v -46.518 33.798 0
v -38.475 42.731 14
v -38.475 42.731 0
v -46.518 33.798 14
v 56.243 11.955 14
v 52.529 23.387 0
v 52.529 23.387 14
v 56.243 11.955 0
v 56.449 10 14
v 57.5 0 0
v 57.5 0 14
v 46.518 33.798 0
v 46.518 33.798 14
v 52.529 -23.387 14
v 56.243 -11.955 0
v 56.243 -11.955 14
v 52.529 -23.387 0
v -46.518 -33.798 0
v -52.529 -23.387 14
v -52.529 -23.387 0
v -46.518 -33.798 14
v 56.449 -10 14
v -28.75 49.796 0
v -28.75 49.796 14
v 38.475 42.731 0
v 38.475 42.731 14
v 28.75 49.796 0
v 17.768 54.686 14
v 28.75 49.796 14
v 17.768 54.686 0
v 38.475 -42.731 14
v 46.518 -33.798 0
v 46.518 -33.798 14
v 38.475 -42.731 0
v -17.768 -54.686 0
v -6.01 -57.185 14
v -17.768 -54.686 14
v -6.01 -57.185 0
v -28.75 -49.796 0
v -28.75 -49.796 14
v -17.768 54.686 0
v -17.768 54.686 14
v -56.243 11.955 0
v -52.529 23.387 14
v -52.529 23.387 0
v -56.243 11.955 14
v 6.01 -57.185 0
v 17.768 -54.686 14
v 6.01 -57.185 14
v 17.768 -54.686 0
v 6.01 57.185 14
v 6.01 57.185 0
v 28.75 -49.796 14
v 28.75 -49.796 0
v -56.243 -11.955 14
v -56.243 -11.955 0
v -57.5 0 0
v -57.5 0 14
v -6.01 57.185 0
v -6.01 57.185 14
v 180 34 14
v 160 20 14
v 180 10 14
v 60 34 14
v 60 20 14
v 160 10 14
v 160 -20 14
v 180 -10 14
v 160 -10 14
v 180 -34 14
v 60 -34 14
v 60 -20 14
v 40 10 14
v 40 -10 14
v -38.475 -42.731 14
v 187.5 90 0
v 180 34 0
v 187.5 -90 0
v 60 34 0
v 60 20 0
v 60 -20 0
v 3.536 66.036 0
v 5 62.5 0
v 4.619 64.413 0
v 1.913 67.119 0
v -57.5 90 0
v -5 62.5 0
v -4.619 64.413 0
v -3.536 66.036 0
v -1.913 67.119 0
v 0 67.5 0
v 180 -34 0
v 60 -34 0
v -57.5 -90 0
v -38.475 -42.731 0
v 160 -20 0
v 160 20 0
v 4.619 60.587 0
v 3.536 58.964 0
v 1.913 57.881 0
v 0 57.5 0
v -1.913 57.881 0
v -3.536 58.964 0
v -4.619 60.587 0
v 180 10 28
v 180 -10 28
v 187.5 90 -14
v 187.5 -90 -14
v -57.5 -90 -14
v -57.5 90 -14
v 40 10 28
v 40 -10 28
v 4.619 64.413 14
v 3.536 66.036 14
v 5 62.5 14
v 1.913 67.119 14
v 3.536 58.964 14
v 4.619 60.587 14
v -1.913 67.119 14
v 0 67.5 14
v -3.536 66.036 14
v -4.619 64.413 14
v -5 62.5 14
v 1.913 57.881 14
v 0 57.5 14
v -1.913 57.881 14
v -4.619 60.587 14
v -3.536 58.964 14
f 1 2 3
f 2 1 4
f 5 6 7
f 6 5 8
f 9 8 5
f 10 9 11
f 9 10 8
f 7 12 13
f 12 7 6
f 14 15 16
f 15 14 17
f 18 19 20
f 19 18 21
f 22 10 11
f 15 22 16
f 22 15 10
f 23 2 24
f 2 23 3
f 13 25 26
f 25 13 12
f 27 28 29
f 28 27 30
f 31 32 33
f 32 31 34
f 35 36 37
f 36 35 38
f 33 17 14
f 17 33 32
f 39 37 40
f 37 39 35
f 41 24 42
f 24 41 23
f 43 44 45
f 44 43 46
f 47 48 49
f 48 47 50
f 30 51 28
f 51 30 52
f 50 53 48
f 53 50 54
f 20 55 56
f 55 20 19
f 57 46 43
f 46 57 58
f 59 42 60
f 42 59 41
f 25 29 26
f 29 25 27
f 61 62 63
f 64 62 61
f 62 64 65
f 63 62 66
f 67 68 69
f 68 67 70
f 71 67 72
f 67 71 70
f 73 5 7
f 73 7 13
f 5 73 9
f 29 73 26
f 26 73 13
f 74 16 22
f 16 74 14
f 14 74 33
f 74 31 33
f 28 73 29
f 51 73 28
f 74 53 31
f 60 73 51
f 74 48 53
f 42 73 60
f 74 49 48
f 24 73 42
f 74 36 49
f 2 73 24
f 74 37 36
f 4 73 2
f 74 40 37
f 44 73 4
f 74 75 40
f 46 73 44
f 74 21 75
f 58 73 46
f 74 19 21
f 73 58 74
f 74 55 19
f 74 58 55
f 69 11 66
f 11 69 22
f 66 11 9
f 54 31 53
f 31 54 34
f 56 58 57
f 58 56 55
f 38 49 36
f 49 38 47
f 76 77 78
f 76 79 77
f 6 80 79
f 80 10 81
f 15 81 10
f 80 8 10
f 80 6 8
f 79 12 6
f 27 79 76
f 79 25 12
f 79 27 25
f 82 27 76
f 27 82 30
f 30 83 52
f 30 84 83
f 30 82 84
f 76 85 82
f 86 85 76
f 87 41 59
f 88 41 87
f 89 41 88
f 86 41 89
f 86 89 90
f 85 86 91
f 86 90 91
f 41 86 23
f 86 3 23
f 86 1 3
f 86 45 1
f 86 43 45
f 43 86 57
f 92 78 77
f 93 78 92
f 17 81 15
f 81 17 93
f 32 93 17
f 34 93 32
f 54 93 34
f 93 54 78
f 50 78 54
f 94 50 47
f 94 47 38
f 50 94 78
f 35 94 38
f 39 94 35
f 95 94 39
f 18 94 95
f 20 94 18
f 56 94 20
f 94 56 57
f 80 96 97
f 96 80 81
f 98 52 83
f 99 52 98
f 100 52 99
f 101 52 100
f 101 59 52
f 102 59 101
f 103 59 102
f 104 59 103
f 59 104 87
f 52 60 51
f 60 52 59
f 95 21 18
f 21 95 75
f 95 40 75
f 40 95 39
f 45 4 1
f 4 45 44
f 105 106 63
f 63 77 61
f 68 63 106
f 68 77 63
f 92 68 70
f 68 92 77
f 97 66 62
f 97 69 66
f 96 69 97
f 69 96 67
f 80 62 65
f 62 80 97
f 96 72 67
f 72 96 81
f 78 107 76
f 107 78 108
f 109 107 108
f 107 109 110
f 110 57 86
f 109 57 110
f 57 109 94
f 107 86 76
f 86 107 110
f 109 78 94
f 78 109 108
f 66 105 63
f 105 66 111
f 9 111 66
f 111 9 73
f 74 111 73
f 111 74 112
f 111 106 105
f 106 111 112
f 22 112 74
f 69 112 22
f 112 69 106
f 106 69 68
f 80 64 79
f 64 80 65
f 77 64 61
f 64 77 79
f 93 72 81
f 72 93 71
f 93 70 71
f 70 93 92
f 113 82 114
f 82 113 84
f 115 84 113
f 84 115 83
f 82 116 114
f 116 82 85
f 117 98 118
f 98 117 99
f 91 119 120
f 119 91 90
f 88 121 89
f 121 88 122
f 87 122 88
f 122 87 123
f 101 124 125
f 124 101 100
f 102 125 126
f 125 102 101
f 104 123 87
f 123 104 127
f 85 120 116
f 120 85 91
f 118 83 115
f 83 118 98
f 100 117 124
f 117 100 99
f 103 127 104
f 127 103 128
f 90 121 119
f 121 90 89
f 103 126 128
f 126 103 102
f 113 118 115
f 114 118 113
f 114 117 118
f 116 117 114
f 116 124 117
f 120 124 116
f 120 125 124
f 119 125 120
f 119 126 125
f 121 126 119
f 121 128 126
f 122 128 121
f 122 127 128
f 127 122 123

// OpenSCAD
module drawRay(p1,p2,width,height){ // draw ray between 2 specified points
    translate((p1+p2)/2)
    rotate([-acos((p2[2]-p1[2]) / norm(p1-p2)),0,
            -atan2(p2[0]-p1[0],p2[1]-p1[1])])
    cube([width,height,norm(p1-p2)+width], center = true);

} 


module Touch1D()
{
    phi = $t*360;
    x = 0;
    y = 0;
    crank_radius = 50.0;
    rod_length = 120.0;
    elements_height = 14;
    rod_width = 20;
      
    
    circle_radius = crank_radius + 7.5;
    
    //Base
    translate([-(crank_radius+7.5), -crank_radius-40, -elements_height]){
        cube([(2.5*crank_radius+rod_length),2*crank_radius+80,elements_height], center = false);
    }
    
    
    //Crank
    translate([x, y, 0]) {

        //1 Crank cylinder
        color([235/255, 227/255, 157/255],0.5)
        cylinder(h = elements_height, r = circle_radius, center = false);

        //3 Hinge pin
        translate([crank_radius*cos(phi),crank_radius*sin(phi),elements_height]){
            pin_radius = 5;
            pin_height = 10;
            color([66/255, 135/255, 245/255],1.0)
            cylinder(h = pin_height, r = pin_radius, center = false);
            //cube([]);
        }
        
    }
    
    slider_y = y;
    slider_x = x + crank_radius * cos(phi) + sqrt(rod_length*rod_length - (crank_radius*sin(phi))*(crank_radius*sin(phi)));
   
    slider_width = 20.0;
    slider_height = 40.0;  
    //5 slider
    translate([slider_x, slider_y, elements_height/2]) {

        cube([slider_width, slider_height, elements_height], center = true);
        
        //4 Hinge pin
        translate([0,0,elements_height/2]){
            pin_radius = 5;
            pin_height = 10;
            color([66/255, 135/255, 245/255],1.0)
            cylinder(h = pin_height, r = pin_radius, center = false);
        }
    }
    
    //2 Rod
    rod_offset = 1.5*elements_height;
    color([],0.5)
    drawRay([crank_radius*cos(phi),crank_radius*sin(phi),rod_offset],
             [slider_x,slider_y,rod_offset],
             width = rod_width, 
             height = elements_height);
    
    //Rails
    rails_begin = x + crank_radius * cos(180) + sqrt(rod_length*rod_length - (crank_radius*sin(180))*(crank_radius*sin(180)));
    rails_end = x + crank_radius * cos(0) + sqrt(rod_length*rod_length - (crank_radius*sin(0))*(crank_radius*sin(0)));
    rails_length = abs(rails_end - rails_begin);
    translate([rails_begin-slider_width/2,slider_height/2,0]) {
        cube([rails_length+slider_width,elements_height,elements_height],center = false);
    }
    translate([rails_begin-slider_width/2,-slider_height/2-elements_height,0]) {
        cube([rails_length+slider_width,elements_height,elements_height],center = false);
    }
    
    // Driver
    motor_radius = 5;
    translate([0,circle_radius+motor_radius,elements_height/2]) {
        cylinder(h = elements_height, r = motor_radius, center = true);
    }
    
    
    /*
    //Hinge pin
    translate(){
        pin_radius = 5;
        pin_height = 10;
        color([66/255, 135/255, 245/255],1.0)
        cylinder(h = pin_height, r = pin_radius, center = false);
    }*/

}

Touch1D();
